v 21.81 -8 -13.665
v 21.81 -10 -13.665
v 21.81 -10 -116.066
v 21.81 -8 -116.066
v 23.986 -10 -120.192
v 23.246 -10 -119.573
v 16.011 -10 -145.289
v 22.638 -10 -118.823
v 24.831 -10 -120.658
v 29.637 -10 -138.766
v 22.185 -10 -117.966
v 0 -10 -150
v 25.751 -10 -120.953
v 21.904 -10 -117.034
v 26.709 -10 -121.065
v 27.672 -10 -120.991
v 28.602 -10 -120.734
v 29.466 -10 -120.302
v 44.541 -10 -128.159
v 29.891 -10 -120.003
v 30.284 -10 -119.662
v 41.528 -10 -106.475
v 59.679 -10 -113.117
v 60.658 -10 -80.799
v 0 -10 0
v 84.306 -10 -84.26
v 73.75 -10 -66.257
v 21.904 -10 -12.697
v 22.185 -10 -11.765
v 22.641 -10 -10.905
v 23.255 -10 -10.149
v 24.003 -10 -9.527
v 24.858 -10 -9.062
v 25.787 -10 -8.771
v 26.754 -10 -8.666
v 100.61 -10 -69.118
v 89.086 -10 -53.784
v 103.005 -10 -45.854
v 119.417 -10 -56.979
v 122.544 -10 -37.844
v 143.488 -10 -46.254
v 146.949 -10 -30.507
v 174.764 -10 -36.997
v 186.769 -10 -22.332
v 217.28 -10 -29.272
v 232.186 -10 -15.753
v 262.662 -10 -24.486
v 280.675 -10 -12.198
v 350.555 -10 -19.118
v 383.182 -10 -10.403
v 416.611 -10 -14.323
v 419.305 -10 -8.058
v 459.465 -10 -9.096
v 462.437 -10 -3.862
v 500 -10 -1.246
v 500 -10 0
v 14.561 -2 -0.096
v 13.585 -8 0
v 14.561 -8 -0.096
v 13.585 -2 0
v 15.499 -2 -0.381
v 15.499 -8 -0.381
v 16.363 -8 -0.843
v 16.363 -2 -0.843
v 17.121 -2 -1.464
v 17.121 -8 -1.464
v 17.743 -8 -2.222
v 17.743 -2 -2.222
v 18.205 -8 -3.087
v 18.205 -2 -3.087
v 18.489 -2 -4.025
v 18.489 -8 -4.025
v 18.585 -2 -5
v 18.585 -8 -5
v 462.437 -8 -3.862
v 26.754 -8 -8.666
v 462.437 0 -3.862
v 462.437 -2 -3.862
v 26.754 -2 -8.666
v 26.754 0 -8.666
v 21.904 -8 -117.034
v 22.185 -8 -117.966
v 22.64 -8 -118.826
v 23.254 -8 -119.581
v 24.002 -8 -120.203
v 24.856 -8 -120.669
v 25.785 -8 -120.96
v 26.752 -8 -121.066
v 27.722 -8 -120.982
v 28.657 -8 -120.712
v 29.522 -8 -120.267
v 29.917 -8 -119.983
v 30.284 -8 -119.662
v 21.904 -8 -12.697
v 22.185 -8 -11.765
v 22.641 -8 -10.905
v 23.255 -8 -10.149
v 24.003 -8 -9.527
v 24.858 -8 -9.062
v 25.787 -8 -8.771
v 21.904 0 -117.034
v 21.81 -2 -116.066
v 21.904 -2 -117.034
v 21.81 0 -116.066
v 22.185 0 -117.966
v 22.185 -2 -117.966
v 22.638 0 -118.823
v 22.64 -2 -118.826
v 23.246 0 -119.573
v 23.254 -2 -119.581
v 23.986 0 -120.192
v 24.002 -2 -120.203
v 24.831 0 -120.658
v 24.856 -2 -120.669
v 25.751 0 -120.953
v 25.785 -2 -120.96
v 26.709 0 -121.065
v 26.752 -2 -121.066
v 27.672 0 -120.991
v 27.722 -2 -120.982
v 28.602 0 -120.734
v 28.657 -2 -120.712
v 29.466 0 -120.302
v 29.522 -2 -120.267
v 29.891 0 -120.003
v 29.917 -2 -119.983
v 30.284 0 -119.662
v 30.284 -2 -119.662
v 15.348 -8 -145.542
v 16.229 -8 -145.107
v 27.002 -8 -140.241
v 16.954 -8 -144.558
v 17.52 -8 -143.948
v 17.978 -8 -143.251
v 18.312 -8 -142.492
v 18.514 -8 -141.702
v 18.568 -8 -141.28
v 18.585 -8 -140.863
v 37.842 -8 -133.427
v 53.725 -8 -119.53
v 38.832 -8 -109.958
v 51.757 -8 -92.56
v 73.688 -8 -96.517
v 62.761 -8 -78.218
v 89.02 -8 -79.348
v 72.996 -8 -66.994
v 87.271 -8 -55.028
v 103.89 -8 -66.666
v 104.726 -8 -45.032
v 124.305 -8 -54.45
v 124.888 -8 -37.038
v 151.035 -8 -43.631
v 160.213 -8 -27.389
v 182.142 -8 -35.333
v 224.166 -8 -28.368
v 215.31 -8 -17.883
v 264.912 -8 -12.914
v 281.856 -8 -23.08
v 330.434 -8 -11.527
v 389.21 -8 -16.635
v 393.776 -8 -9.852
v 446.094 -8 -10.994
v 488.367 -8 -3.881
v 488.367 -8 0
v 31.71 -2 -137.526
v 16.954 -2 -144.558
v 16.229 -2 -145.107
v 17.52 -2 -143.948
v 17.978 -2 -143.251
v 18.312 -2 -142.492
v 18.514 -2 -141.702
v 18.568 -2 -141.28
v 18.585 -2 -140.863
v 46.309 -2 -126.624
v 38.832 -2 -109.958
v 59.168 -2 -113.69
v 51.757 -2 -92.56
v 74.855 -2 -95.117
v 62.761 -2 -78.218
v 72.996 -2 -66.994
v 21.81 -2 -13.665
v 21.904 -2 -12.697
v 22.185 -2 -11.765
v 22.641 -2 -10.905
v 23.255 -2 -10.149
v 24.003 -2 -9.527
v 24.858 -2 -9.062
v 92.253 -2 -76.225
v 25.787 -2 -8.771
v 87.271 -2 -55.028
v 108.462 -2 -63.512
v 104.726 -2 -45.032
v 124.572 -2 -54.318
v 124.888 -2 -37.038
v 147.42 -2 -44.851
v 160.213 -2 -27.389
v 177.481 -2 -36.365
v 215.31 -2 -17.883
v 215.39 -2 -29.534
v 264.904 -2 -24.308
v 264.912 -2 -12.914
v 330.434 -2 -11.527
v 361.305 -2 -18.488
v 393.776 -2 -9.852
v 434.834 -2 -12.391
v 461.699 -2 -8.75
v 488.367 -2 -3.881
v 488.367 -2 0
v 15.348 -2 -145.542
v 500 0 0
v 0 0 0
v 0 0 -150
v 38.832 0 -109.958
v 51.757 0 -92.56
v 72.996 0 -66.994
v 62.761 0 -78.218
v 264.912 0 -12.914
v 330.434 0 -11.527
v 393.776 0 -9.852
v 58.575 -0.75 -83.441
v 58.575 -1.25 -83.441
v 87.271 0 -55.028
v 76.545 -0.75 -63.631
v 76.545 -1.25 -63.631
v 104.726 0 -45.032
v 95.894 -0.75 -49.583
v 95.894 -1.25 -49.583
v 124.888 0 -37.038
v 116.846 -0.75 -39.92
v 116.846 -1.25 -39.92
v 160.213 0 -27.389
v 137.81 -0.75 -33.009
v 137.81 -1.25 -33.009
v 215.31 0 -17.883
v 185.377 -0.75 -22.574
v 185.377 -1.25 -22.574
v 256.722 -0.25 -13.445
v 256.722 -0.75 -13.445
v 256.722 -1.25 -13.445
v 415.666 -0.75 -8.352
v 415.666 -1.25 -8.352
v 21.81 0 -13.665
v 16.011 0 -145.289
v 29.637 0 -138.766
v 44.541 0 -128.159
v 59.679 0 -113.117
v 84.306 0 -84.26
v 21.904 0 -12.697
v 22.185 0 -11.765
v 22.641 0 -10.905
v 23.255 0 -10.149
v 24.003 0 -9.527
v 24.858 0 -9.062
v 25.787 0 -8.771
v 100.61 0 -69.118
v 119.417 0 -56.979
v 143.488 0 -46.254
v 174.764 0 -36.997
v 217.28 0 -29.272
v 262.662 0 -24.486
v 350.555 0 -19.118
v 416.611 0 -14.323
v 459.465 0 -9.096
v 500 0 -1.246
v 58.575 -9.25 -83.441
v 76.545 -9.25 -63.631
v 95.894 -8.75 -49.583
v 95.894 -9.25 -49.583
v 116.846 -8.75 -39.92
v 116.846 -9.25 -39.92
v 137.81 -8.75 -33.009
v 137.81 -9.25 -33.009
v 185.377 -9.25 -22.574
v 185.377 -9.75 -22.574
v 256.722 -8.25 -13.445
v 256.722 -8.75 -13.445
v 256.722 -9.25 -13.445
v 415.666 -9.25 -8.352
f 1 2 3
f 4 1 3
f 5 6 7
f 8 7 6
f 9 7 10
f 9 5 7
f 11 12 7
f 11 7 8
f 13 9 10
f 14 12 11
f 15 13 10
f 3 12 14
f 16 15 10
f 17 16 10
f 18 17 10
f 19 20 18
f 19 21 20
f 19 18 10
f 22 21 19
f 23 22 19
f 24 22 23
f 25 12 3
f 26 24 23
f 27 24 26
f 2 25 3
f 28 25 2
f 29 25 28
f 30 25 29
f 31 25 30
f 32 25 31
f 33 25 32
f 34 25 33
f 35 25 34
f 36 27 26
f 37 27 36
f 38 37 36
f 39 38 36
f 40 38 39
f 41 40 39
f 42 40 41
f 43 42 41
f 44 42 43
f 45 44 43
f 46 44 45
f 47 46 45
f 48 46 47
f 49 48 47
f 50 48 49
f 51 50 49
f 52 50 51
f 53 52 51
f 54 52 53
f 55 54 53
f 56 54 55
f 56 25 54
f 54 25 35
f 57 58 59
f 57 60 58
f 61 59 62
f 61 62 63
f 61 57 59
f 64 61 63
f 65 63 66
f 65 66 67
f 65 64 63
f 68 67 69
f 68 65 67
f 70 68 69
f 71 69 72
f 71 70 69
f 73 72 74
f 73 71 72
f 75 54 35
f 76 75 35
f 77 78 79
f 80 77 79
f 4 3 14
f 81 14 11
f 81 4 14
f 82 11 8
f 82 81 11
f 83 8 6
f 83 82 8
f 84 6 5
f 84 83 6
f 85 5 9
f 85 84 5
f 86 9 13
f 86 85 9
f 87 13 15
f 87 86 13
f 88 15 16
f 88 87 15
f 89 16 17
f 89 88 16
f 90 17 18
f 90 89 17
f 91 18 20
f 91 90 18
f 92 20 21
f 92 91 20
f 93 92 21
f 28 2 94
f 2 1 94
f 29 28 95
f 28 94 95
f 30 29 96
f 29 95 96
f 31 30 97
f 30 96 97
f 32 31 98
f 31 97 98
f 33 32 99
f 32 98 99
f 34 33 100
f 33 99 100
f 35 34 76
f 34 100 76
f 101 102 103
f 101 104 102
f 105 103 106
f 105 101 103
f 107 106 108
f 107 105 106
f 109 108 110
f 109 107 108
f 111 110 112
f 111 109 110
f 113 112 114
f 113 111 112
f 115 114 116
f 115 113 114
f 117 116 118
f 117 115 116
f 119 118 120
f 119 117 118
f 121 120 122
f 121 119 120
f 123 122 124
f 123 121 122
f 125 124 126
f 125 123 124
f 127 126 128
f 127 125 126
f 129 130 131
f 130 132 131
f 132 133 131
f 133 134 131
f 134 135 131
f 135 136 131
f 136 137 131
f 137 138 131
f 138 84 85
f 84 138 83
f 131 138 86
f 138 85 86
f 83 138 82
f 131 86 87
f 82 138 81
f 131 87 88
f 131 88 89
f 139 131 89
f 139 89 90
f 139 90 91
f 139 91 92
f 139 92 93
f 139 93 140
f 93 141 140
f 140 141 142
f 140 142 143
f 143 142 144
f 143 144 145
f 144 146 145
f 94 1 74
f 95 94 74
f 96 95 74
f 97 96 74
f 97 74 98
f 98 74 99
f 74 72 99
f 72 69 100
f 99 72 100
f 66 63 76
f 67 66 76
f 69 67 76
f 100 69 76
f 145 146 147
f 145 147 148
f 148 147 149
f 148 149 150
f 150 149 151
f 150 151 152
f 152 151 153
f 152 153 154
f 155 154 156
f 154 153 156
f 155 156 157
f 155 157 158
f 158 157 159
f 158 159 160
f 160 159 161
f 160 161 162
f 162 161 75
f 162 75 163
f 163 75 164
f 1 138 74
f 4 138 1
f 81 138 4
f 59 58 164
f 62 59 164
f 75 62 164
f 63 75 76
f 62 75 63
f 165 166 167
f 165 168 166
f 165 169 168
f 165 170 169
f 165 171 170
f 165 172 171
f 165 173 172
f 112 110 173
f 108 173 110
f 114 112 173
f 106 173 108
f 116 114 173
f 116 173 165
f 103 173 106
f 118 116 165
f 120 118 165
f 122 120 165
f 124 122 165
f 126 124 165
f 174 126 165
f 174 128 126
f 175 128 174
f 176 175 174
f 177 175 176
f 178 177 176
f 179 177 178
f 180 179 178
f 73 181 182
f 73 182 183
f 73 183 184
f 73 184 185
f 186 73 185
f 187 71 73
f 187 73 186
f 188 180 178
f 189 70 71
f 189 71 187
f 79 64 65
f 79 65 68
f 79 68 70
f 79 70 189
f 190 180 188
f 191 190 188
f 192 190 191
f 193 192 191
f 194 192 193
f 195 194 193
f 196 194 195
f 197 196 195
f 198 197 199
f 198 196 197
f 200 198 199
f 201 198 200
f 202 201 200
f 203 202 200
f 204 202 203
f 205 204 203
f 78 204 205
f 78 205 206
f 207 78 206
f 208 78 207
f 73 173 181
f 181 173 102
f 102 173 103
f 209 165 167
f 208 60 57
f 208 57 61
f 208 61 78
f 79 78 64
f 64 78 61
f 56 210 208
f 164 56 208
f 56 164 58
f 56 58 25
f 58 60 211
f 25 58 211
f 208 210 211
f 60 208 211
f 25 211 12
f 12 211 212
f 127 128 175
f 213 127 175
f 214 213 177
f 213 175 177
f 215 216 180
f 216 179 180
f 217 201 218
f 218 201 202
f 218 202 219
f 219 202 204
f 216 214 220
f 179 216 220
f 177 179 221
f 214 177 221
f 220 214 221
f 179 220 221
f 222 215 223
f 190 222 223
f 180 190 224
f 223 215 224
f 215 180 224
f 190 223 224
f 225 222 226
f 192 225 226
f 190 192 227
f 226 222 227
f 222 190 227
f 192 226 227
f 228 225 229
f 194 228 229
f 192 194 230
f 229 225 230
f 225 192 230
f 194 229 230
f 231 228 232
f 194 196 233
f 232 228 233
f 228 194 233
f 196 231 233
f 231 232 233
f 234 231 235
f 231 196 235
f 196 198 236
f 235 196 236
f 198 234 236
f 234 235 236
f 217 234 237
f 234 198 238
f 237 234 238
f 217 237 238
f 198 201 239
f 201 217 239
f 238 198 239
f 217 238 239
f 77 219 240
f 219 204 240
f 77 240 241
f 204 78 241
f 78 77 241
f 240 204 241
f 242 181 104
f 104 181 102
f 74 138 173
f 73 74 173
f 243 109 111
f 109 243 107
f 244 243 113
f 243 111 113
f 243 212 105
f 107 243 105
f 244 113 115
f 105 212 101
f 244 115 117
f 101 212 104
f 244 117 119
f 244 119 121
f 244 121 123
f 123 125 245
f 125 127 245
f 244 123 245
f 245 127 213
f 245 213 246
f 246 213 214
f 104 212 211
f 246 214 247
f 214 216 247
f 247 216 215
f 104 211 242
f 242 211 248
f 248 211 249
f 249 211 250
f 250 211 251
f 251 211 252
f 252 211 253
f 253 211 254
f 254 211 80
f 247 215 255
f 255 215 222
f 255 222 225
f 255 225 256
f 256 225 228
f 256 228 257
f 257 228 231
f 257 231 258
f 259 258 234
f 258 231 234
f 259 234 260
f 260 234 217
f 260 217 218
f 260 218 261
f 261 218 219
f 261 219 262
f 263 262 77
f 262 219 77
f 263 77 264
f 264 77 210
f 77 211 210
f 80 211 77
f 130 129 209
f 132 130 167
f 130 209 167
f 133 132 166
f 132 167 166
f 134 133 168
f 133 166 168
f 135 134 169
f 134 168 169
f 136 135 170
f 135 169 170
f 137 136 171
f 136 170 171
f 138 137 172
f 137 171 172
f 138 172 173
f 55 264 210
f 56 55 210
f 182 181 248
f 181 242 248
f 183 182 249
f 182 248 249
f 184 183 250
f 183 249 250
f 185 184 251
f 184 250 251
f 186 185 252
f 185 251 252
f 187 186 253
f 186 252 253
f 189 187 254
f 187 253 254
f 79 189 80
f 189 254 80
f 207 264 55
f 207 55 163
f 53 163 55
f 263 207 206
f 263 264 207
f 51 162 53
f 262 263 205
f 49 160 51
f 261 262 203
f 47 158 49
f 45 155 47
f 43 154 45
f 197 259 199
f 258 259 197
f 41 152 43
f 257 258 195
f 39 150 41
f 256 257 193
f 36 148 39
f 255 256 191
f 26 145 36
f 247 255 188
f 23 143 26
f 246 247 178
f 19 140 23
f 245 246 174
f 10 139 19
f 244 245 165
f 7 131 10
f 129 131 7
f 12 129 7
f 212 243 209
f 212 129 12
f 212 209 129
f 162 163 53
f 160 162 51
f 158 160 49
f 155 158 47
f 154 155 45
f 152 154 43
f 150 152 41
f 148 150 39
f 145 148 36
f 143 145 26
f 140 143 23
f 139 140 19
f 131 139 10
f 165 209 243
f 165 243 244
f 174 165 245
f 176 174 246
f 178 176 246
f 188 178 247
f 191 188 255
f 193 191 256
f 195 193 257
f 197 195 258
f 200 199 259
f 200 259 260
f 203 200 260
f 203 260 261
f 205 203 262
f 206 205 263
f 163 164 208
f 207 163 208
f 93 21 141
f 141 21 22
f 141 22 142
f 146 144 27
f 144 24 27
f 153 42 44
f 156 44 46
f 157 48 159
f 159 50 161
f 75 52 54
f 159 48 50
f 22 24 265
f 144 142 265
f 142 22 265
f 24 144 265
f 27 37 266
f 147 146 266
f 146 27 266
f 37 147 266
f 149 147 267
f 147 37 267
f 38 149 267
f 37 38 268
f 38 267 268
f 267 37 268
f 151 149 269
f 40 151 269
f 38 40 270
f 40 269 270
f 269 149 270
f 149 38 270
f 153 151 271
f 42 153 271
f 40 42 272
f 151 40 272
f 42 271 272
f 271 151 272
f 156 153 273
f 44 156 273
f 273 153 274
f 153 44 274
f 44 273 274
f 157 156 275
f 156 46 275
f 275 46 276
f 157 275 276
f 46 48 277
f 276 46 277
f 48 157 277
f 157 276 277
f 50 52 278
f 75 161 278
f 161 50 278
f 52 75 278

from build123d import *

# Parameters (mm, degrees)
F1_DEPTH = 10
F2_W     = 469.7814304382
F2_H     = 6
F3_DEPTH = 150.0010001
F5_DEPTH = 10.0010001
F6_R     = 5
F7_R     = 5
F8_R     = 5


with BuildPart() as f1:
    # F0 (on Front) → F1 (new body)
    with BuildSketch(Plane.XZ):
        with BuildLine():
            Line((490, 0), (0, 0))
            Line((0, 0), (0, -150))
            add(Edge.make_bspline(
                [(500, -1.2464135636), (423.341869886, -19.8031308411), (250.2658375262, -16.8992488433), (81.5432391027, -54.6469734319), (51.3085768442, -139.1068788057), (0, -150)],
                knots=[0.0086627482, 0.0086627482, 0.0086627482, 0.0086627482, 0.4048702251, 0.7224990596, 1, 1, 1, 1], degree=3))
            Line((500, -1.2464135636), (500, 0))
            Line((500, 0), (490, 0))
        make_face()
    extrude(amount=F1_DEPTH)

    # F2 (on face) → F3 (cut, through all)
    with BuildSketch(Plane.XY):
        with Locations((253.4761568531, -5)):
            Rectangle(F2_W, F2_H)
    extrude(amount=-F3_DEPTH, mode=Mode.SUBTRACT)

    # F4 (on face) → F5 (cut, through all)
    with BuildSketch(Plane.XZ.offset(10)):
        with BuildLine():
            Line((462.436914444, -3.8619996049), (21.8095220625, -8.7202985799))
            Line((21.8095220625, -8.7202985799), (21.8095220625, -125.4975497723))
            add(Edge.make_bspline(
                [(21.8095220625, -125.4975497723), (32.2172713088, -122.0650961288), (58.781928291, -78.761668078), (92.6378446485, -47.690248313), (138.7348383302, -32.0204151339), (174.8869961471, -23.9386402043), (258.5337585047, -10.39108363), (349.9261967141, -12.3776767113), (414.1226552212, -8.9335112217), (447.8440516291, -5.407736286), (462.436914444, -3.8619996049)],
                knots=[0, 0, 0, 0, 0.1222772174, 0.2384113906, 0.3482499842, 0.44801593, 0.5974551949, 0.7568224846, 0.8878563996, 1, 1, 1, 1], degree=3))
        make_face()
    extrude(amount=-F5_DEPTH, mode=Mode.SUBTRACT)

    # F6
    f6_edges = [f1.edges().sort_by_distance(p)[0] for p in [
        (21.809522, -9, -125.49755),
        (21.809522, -1, -125.49755),
    ]]
    fillet(f6_edges, radius=F6_R)

    # F7
    f7_edges = [f1.edges().sort_by_distance(p)[0] for p in [
        (21.809522, -9, -8.720299),
        (21.809522, -1, -8.720299),
    ]]
    fillet(f7_edges, radius=F7_R)

    # F8
    f8_edges = [f1.edges().sort_by_distance(p)[0] for p in [
        (18.585442, -5, -144.255465),
        (18.585442, -5, 0),
    ]]
    fillet(f8_edges, radius=F8_R)


solid = f1.part
